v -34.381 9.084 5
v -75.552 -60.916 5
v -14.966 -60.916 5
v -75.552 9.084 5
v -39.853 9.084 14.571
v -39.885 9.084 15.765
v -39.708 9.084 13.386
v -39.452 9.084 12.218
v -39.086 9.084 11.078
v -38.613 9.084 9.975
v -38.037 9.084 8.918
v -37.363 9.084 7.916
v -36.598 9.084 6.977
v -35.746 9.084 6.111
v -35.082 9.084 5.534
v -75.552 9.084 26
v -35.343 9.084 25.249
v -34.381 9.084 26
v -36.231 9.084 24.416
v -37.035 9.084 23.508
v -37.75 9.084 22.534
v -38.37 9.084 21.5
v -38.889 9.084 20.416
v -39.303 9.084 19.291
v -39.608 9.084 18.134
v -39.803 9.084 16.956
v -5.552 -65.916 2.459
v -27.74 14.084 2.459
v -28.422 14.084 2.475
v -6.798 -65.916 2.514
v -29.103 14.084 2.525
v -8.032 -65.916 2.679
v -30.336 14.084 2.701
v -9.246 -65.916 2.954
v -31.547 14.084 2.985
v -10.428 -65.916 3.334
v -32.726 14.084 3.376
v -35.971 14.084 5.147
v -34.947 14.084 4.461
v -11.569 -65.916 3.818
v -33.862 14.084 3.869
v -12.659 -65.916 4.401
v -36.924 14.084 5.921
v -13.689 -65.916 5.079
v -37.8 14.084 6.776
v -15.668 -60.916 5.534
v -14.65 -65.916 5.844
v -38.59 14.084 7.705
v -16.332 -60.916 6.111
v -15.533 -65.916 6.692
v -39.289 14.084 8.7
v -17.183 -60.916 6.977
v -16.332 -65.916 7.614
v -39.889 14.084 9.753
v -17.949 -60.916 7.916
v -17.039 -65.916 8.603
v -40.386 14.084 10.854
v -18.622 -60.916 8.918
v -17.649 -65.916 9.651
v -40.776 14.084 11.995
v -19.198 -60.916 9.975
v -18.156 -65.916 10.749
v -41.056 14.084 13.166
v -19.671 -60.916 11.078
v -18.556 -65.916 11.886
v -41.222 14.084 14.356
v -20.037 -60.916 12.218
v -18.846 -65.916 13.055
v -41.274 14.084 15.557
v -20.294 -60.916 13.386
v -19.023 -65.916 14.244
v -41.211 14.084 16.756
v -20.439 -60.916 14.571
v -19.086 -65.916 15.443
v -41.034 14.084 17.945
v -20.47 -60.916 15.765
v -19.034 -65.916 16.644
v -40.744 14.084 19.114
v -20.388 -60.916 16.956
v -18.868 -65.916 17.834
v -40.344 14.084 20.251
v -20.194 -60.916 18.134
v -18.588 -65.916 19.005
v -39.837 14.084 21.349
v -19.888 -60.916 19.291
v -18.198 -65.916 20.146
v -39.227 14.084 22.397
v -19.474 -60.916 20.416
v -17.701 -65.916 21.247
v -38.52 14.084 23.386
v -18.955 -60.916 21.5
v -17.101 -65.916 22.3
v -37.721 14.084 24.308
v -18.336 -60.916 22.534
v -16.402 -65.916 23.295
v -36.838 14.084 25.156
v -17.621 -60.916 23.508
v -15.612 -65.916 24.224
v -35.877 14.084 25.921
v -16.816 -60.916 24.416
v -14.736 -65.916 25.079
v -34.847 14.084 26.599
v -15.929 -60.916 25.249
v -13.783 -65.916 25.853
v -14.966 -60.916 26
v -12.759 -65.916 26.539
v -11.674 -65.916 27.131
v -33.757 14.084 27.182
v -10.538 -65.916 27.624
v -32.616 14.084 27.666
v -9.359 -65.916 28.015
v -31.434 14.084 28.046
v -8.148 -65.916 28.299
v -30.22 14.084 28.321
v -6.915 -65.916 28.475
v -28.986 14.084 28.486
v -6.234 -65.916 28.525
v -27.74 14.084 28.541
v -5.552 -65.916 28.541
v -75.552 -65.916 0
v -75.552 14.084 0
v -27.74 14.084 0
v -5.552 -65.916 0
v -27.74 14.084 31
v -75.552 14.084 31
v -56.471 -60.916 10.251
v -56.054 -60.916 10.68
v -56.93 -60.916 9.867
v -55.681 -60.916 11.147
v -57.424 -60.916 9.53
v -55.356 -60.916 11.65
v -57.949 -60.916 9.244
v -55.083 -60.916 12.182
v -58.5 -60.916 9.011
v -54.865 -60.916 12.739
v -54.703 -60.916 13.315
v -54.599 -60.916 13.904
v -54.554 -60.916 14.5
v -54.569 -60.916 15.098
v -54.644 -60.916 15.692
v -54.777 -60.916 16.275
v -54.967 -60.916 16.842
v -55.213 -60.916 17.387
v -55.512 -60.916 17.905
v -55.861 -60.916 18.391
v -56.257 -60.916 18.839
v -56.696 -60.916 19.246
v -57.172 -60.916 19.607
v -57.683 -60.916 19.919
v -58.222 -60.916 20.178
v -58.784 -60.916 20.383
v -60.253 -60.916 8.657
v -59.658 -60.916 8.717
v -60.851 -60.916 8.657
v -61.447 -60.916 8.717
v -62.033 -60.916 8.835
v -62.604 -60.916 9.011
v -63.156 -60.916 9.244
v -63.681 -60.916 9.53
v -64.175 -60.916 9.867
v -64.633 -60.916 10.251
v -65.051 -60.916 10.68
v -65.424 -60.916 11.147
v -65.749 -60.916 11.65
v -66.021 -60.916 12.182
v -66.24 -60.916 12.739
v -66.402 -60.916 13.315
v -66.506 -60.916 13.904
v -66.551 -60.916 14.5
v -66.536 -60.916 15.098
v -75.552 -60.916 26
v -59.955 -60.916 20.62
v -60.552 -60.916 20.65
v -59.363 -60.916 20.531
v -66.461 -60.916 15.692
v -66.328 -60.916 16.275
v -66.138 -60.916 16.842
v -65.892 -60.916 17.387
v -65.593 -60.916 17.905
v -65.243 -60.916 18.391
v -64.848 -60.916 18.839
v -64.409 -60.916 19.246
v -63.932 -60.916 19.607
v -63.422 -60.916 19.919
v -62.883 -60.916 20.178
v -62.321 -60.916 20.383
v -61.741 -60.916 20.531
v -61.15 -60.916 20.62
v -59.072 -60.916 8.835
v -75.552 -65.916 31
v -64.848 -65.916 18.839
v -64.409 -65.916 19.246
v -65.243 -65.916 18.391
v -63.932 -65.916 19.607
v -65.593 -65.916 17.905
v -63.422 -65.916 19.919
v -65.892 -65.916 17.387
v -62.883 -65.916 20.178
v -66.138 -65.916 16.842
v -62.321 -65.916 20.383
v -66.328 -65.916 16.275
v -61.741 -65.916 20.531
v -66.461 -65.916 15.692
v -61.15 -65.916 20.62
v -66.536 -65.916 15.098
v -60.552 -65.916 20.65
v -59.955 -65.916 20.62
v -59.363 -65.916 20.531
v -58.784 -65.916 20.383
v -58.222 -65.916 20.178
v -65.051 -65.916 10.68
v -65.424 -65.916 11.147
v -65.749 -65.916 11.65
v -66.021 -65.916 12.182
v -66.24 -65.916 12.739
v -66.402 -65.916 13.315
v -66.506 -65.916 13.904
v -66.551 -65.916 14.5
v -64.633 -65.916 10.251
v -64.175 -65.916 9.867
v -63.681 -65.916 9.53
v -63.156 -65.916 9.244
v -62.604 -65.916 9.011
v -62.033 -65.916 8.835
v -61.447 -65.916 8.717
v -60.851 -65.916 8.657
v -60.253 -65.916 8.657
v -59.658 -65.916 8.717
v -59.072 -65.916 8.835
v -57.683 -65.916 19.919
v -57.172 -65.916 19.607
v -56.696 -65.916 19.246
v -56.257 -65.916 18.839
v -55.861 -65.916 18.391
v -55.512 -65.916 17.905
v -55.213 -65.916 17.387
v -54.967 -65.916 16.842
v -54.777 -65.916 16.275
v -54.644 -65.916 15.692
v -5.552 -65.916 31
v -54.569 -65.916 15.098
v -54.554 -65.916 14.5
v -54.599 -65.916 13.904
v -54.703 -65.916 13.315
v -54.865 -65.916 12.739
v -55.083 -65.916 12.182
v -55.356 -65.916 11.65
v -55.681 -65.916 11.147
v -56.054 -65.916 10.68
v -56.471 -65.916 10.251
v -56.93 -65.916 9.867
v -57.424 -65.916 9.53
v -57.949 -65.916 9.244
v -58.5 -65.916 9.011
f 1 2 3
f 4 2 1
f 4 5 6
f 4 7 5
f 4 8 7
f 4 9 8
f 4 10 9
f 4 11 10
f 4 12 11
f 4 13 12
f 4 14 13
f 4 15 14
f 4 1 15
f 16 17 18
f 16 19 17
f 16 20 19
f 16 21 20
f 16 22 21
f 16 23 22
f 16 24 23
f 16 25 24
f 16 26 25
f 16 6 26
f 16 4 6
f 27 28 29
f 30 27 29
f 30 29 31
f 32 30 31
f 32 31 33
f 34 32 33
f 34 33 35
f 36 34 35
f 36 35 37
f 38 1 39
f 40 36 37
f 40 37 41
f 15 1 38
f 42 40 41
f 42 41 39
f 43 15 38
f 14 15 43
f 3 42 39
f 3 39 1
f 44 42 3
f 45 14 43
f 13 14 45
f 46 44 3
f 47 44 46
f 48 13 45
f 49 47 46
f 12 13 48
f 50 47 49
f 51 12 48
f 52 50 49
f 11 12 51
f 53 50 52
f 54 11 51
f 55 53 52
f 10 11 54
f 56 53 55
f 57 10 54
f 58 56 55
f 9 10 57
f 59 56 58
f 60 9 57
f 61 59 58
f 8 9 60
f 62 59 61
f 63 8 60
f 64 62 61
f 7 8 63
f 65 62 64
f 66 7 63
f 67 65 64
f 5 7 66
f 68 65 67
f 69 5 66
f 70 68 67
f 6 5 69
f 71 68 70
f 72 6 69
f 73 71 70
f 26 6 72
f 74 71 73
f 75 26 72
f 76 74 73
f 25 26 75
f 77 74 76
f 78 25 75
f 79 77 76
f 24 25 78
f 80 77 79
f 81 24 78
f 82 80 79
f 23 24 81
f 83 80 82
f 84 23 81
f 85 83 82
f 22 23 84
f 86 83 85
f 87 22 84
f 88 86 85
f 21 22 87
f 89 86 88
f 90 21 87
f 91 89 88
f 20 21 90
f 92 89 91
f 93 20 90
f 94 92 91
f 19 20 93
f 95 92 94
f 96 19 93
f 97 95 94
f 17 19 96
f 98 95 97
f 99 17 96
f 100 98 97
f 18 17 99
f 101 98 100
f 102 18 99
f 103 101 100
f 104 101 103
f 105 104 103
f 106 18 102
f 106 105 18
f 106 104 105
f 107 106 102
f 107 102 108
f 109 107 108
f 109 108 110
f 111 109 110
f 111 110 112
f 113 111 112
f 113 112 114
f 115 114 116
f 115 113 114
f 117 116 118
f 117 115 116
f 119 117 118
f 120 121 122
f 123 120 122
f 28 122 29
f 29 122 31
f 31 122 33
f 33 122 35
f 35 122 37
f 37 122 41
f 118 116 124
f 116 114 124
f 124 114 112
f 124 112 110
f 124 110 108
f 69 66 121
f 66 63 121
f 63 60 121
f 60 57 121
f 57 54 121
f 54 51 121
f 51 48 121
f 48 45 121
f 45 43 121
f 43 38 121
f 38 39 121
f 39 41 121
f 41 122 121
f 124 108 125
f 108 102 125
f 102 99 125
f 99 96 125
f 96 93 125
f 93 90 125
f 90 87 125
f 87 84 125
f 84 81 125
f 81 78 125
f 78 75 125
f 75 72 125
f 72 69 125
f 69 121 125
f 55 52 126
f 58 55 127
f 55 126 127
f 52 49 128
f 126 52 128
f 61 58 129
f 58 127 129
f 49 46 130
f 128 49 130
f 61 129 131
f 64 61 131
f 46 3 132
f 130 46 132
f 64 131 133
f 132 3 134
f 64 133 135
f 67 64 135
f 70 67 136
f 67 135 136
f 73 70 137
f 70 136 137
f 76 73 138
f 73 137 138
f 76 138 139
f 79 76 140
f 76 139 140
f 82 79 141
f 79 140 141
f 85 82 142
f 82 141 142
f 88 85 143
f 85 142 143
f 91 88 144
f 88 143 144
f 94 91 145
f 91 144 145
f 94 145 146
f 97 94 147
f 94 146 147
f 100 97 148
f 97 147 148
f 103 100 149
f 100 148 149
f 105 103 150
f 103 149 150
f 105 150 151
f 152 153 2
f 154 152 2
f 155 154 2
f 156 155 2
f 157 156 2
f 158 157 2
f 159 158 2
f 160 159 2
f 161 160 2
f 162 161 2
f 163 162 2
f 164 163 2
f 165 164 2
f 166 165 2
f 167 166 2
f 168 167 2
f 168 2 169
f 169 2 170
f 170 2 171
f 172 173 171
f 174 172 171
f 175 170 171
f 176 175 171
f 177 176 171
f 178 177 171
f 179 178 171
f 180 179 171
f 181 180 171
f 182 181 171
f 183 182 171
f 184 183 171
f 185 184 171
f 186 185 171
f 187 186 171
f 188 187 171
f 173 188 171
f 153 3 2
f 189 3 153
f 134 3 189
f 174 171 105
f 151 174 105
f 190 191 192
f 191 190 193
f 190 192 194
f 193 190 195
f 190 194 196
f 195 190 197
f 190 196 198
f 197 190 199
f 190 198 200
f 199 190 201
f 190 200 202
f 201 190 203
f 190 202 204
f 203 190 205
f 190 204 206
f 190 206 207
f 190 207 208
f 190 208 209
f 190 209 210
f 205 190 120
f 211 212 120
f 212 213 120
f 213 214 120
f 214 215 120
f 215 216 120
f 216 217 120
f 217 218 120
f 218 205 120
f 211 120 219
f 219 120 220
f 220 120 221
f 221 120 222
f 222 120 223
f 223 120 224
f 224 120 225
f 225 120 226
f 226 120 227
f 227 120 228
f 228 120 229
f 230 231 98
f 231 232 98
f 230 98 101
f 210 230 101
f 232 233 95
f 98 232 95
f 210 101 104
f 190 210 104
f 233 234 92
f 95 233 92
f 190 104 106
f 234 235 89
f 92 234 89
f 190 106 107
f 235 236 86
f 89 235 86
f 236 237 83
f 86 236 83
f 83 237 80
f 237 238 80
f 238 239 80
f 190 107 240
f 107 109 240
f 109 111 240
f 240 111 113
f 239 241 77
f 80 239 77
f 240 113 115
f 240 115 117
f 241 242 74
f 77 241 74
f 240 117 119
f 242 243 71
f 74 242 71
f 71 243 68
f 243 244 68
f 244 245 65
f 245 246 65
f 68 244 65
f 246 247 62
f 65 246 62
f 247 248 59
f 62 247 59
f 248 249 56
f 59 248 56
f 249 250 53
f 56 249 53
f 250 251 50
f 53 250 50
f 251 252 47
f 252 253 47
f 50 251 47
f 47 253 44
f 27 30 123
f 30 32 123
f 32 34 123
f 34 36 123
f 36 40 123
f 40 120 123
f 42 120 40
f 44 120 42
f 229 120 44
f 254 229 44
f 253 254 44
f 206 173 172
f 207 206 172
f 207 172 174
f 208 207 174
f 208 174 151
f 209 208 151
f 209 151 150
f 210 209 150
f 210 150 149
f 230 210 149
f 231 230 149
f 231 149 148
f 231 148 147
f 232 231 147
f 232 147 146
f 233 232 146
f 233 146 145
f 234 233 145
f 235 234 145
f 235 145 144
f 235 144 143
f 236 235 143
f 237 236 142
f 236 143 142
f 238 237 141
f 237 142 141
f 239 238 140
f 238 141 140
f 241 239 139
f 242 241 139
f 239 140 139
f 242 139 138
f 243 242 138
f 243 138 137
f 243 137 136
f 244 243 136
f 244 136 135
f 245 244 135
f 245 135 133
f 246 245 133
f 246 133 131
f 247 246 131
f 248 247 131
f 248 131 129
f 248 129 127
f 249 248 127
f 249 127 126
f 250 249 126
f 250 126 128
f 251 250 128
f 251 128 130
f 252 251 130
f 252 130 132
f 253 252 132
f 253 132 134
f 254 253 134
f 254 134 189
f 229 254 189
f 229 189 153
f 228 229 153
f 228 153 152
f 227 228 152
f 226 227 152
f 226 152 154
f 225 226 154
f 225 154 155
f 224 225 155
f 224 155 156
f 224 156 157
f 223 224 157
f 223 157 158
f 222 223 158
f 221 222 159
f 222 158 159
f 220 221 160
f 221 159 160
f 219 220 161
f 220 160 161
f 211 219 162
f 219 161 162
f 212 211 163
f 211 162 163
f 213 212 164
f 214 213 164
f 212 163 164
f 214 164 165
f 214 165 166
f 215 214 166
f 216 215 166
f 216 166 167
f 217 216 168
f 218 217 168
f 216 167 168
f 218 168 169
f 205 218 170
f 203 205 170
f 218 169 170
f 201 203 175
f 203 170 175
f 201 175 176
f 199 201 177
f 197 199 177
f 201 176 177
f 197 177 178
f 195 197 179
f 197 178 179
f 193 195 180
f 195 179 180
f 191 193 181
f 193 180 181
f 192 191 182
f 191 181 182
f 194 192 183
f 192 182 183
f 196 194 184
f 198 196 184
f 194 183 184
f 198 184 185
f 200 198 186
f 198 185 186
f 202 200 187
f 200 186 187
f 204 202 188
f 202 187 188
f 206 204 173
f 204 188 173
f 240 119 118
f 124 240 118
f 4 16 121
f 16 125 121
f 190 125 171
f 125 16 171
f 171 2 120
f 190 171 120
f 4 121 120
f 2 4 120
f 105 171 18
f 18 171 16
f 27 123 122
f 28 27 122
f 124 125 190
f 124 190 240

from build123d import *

# Parameters (mm, degrees)
BOSS_EXTRUDE1_DEPTH     = 31
SKETCH5_W               = 21
SKETCH5_H               = 70
CUT_EXTRUDE3_DEPTH      = 110
SKETCH6_R               = 6
CUT_EXTRUDE4_DEPTH      = 110
SKETCH7_W               = 82.876057885
SKETCH7_H               = 21.558852062
CUT_EXTRUDE5_DEPTH      = 110
CUT_EXTRUDE6_DEPTH      = 116.208083877
CUT_EXTRUDE6_DEPTH_BACK = 116.208083877
SKETCH8_R               = 13.04144487


with BuildPart() as part:
    # Sketch1 → Boss-Extrude1 (new body)
    with BuildSketch(Plane.XY):
        Polygon((-75.552372261, 34.084409915), (-75.552372261, -65.915590085), (-5.552372261, -65.915590085), (-33.28739918, 34.084409915), align=None)
    extrude(amount=BOSS_EXTRUDE1_DEPTH)

    # Sketch5 → Cut-Extrude3 (cut)
    with BuildSketch(Plane.ZY.offset(75.552372261)):
        with Locations((15.5, -25.915590085)):
            Rectangle(SKETCH5_W, SKETCH5_H)
    extrude(amount=-CUT_EXTRUDE3_DEPTH, mode=Mode.SUBTRACT)

    # Sketch6 → Cut-Extrude4 (cut)
    with BuildSketch(Plane(origin=(0, -60.915590085, 0), x_dir=(1, 0, 0), z_dir=(0, 1, 0))):
        with Locations(Location((-60.552372261, -14.649638942, 0), (0, 0, 270))):
            Circle(SKETCH6_R)
    extrude(amount=-CUT_EXTRUDE4_DEPTH, mode=Mode.SUBTRACT)

    # Sketch7 → Cut-Extrude5 (cut)
    with BuildSketch(Plane.ZY.offset(75.552372261)):
        with Locations((20.394948081, 24.863835946)):
            Rectangle(SKETCH7_W, SKETCH7_H)
    extrude(amount=-CUT_EXTRUDE5_DEPTH, mode=Mode.SUBTRACT)

    # Sketch8 → Cut-Extrude6 (cut, two sides: drawn at the far end of the back side and taken through both)
    with BuildSketch(Plane(origin=(-5.60875104, 20.222626991, 0), x_dir=(0.9636240692030443, 0.2672613949910582, 0), z_dir=(-0.2672613949910583, 0.9636240692030444, 0)).offset(-CUT_EXTRUDE6_DEPTH_BACK)):
        with Locations((-22.96709211, -15.5)):
            Circle(SKETCH8_R)
    extrude(amount=CUT_EXTRUDE6_DEPTH + CUT_EXTRUDE6_DEPTH_BACK, mode=Mode.SUBTRACT)


solid = part.part
